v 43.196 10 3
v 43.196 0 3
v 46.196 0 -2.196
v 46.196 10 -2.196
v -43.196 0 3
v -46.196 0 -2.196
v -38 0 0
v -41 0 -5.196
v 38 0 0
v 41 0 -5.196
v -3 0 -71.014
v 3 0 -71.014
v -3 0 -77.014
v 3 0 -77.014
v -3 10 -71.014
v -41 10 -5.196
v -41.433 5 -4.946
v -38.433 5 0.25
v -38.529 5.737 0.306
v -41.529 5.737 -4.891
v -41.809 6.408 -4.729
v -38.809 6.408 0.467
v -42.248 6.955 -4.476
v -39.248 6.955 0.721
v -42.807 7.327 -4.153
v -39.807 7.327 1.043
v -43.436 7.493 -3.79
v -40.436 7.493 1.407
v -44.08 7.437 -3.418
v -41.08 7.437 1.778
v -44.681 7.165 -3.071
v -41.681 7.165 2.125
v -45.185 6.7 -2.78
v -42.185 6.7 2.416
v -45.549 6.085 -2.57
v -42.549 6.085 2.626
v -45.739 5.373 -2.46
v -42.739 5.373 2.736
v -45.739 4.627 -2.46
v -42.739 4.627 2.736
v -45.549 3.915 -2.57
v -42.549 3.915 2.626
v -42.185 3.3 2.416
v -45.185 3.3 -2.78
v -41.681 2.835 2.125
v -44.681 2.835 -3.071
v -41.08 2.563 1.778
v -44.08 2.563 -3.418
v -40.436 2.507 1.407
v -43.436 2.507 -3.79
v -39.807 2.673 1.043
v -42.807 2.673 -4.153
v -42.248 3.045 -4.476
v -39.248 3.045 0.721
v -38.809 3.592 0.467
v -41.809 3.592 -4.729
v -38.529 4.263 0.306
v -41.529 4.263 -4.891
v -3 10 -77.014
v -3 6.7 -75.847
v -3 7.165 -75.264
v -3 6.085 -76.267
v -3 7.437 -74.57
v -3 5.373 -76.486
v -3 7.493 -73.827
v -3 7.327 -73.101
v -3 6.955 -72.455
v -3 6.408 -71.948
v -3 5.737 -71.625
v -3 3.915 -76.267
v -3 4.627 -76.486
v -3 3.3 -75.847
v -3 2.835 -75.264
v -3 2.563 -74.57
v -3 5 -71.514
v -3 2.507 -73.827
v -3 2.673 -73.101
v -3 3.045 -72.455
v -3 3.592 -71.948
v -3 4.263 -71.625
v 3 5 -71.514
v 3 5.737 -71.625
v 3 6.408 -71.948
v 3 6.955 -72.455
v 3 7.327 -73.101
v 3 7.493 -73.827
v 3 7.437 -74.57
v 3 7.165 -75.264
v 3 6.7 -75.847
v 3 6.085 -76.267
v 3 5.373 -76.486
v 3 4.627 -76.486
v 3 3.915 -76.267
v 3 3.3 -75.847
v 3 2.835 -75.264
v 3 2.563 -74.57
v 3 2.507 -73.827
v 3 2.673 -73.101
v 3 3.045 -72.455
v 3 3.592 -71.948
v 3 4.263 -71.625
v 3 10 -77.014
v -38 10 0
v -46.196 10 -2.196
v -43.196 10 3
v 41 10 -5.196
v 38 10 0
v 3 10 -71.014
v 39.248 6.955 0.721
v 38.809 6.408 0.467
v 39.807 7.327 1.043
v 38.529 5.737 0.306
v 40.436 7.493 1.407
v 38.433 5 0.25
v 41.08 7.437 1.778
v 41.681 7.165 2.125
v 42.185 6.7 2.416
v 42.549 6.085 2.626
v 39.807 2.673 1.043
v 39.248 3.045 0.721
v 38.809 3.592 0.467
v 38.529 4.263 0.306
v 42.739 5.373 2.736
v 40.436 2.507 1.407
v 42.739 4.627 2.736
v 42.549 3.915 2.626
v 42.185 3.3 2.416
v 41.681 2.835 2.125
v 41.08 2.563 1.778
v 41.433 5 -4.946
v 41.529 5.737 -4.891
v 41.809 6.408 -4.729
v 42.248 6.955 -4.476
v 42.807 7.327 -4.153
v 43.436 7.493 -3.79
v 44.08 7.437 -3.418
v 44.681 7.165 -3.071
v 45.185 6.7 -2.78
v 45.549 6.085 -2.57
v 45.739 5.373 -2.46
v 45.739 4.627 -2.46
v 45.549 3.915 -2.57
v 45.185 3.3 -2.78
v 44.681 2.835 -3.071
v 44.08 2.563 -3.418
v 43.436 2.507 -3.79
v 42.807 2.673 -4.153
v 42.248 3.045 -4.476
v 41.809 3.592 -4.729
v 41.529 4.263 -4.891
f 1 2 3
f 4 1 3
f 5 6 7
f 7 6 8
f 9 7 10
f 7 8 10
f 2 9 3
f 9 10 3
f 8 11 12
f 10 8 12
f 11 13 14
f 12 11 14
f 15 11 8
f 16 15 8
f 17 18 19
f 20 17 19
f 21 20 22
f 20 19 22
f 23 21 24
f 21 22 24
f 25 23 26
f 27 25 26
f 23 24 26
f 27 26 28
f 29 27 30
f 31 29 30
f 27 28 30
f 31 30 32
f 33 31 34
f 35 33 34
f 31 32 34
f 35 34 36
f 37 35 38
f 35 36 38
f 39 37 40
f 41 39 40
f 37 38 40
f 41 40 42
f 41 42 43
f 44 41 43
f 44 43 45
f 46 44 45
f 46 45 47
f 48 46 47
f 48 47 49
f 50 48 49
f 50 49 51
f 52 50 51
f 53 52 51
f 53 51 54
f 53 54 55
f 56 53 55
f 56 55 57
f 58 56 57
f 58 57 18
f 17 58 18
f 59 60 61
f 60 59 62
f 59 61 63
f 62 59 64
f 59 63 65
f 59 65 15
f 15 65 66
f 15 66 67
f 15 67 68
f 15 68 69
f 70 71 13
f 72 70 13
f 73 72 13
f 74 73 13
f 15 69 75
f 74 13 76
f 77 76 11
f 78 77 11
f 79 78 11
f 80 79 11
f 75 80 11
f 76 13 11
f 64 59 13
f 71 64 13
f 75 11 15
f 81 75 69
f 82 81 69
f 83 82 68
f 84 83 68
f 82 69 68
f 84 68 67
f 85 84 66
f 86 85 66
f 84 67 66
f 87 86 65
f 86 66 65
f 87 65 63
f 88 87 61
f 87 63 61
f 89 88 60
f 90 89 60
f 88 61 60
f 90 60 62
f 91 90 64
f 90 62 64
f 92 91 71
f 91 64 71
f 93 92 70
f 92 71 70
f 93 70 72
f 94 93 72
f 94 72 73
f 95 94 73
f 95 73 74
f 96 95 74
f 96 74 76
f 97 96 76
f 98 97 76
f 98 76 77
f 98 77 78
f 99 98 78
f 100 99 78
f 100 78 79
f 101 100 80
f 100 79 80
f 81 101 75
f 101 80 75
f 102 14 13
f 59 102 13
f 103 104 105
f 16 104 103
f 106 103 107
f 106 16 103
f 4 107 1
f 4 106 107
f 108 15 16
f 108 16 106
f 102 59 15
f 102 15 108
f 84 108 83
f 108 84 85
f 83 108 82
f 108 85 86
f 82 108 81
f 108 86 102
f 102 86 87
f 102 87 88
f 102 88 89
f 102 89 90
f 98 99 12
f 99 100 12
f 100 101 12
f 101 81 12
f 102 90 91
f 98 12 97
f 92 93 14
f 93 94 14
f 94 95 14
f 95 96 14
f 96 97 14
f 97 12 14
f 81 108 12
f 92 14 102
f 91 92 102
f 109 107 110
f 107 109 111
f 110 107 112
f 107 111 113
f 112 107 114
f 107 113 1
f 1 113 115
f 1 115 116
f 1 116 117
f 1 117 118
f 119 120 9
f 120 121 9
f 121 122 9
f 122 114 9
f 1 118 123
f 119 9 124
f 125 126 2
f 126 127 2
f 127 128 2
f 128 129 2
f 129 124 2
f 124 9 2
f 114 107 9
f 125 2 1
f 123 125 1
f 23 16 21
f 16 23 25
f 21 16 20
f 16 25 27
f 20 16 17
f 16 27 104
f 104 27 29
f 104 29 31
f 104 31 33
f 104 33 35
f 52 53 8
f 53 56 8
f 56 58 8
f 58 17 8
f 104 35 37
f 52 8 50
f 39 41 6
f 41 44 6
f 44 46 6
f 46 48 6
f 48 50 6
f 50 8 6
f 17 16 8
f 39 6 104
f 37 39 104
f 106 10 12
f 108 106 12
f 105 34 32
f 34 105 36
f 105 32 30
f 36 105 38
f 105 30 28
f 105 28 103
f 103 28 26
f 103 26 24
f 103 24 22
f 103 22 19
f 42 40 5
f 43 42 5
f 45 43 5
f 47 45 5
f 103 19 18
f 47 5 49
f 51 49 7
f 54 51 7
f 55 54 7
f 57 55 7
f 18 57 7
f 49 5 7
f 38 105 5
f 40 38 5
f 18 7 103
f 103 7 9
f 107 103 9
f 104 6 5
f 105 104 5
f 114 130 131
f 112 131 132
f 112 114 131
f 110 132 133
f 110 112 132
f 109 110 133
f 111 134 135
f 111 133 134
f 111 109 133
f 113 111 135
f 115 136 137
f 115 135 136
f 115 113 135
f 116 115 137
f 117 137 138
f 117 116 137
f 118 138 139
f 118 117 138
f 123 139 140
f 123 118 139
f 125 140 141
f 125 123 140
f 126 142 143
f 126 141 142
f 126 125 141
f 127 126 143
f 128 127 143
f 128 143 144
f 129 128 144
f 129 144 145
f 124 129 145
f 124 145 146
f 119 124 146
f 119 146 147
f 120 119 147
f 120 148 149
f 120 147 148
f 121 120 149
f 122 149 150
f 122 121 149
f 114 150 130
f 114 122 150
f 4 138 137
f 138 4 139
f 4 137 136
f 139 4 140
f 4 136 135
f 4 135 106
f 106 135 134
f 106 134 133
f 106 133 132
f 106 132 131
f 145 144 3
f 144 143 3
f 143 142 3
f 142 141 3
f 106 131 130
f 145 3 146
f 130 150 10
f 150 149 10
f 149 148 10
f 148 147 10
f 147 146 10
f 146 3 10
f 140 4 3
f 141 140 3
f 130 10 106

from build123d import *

# Parameters (mm, degrees)
BOSS_EXTRUDE1_DEPTH = 10
SKETCH2_R           = 2.5
CUT_EXTRUDE1_DEPTH  = 88.866025
SKETCH3_R           = 2.5
CUT_EXTRUDE2_DEPTH  = 6


with BuildPart() as part:
    # Sketch1 → Boss-Extrude1 (new body)
    with BuildSketch(Plane(origin=(0, 0, 0), x_dir=(1, 0, 0), z_dir=(0, 1, 0))):
        Polygon((-3, 71.01408311), (-41, 5.196152423), (-46.196152423, 2.196152423), (-43.196152423, -3), (-38, 0), (38, 0), (43.196152423, -3), (46.196152423, 2.196152423), (41, 5.196152423), (3, 71.01408311), (3, 77.01408311), (-3, 77.01408311), align=None)
    extrude(amount=BOSS_EXTRUDE1_DEPTH)

    # Sketch2 → Cut-Extrude1 (cut)
    with BuildSketch(Plane(origin=(-9.5, 0, -16.454482672), x_dir=(0.866025404, 0, -0.5), z_dir=(0.5, 0, 0.866025404))):
        with Locations((-35.908965344, 5)):
            Circle(SKETCH2_R)
    cut_extrude1 = extrude(amount=-CUT_EXTRUDE1_DEPTH, mode=Mode.SUBTRACT)

    # Mirror6: Cut-Extrude1 across plane
    add(cut_extrude1.mirror(Plane.ZY), mode=Mode.SUBTRACT)

    # Sketch3 → Cut-Extrude2 (cut)
    with BuildSketch(Plane.ZY.offset(3)):
        with Locations((-74.01408311, 5)):
            Circle(SKETCH3_R)
    extrude(amount=-CUT_EXTRUDE2_DEPTH, mode=Mode.SUBTRACT)


solid = part.part
